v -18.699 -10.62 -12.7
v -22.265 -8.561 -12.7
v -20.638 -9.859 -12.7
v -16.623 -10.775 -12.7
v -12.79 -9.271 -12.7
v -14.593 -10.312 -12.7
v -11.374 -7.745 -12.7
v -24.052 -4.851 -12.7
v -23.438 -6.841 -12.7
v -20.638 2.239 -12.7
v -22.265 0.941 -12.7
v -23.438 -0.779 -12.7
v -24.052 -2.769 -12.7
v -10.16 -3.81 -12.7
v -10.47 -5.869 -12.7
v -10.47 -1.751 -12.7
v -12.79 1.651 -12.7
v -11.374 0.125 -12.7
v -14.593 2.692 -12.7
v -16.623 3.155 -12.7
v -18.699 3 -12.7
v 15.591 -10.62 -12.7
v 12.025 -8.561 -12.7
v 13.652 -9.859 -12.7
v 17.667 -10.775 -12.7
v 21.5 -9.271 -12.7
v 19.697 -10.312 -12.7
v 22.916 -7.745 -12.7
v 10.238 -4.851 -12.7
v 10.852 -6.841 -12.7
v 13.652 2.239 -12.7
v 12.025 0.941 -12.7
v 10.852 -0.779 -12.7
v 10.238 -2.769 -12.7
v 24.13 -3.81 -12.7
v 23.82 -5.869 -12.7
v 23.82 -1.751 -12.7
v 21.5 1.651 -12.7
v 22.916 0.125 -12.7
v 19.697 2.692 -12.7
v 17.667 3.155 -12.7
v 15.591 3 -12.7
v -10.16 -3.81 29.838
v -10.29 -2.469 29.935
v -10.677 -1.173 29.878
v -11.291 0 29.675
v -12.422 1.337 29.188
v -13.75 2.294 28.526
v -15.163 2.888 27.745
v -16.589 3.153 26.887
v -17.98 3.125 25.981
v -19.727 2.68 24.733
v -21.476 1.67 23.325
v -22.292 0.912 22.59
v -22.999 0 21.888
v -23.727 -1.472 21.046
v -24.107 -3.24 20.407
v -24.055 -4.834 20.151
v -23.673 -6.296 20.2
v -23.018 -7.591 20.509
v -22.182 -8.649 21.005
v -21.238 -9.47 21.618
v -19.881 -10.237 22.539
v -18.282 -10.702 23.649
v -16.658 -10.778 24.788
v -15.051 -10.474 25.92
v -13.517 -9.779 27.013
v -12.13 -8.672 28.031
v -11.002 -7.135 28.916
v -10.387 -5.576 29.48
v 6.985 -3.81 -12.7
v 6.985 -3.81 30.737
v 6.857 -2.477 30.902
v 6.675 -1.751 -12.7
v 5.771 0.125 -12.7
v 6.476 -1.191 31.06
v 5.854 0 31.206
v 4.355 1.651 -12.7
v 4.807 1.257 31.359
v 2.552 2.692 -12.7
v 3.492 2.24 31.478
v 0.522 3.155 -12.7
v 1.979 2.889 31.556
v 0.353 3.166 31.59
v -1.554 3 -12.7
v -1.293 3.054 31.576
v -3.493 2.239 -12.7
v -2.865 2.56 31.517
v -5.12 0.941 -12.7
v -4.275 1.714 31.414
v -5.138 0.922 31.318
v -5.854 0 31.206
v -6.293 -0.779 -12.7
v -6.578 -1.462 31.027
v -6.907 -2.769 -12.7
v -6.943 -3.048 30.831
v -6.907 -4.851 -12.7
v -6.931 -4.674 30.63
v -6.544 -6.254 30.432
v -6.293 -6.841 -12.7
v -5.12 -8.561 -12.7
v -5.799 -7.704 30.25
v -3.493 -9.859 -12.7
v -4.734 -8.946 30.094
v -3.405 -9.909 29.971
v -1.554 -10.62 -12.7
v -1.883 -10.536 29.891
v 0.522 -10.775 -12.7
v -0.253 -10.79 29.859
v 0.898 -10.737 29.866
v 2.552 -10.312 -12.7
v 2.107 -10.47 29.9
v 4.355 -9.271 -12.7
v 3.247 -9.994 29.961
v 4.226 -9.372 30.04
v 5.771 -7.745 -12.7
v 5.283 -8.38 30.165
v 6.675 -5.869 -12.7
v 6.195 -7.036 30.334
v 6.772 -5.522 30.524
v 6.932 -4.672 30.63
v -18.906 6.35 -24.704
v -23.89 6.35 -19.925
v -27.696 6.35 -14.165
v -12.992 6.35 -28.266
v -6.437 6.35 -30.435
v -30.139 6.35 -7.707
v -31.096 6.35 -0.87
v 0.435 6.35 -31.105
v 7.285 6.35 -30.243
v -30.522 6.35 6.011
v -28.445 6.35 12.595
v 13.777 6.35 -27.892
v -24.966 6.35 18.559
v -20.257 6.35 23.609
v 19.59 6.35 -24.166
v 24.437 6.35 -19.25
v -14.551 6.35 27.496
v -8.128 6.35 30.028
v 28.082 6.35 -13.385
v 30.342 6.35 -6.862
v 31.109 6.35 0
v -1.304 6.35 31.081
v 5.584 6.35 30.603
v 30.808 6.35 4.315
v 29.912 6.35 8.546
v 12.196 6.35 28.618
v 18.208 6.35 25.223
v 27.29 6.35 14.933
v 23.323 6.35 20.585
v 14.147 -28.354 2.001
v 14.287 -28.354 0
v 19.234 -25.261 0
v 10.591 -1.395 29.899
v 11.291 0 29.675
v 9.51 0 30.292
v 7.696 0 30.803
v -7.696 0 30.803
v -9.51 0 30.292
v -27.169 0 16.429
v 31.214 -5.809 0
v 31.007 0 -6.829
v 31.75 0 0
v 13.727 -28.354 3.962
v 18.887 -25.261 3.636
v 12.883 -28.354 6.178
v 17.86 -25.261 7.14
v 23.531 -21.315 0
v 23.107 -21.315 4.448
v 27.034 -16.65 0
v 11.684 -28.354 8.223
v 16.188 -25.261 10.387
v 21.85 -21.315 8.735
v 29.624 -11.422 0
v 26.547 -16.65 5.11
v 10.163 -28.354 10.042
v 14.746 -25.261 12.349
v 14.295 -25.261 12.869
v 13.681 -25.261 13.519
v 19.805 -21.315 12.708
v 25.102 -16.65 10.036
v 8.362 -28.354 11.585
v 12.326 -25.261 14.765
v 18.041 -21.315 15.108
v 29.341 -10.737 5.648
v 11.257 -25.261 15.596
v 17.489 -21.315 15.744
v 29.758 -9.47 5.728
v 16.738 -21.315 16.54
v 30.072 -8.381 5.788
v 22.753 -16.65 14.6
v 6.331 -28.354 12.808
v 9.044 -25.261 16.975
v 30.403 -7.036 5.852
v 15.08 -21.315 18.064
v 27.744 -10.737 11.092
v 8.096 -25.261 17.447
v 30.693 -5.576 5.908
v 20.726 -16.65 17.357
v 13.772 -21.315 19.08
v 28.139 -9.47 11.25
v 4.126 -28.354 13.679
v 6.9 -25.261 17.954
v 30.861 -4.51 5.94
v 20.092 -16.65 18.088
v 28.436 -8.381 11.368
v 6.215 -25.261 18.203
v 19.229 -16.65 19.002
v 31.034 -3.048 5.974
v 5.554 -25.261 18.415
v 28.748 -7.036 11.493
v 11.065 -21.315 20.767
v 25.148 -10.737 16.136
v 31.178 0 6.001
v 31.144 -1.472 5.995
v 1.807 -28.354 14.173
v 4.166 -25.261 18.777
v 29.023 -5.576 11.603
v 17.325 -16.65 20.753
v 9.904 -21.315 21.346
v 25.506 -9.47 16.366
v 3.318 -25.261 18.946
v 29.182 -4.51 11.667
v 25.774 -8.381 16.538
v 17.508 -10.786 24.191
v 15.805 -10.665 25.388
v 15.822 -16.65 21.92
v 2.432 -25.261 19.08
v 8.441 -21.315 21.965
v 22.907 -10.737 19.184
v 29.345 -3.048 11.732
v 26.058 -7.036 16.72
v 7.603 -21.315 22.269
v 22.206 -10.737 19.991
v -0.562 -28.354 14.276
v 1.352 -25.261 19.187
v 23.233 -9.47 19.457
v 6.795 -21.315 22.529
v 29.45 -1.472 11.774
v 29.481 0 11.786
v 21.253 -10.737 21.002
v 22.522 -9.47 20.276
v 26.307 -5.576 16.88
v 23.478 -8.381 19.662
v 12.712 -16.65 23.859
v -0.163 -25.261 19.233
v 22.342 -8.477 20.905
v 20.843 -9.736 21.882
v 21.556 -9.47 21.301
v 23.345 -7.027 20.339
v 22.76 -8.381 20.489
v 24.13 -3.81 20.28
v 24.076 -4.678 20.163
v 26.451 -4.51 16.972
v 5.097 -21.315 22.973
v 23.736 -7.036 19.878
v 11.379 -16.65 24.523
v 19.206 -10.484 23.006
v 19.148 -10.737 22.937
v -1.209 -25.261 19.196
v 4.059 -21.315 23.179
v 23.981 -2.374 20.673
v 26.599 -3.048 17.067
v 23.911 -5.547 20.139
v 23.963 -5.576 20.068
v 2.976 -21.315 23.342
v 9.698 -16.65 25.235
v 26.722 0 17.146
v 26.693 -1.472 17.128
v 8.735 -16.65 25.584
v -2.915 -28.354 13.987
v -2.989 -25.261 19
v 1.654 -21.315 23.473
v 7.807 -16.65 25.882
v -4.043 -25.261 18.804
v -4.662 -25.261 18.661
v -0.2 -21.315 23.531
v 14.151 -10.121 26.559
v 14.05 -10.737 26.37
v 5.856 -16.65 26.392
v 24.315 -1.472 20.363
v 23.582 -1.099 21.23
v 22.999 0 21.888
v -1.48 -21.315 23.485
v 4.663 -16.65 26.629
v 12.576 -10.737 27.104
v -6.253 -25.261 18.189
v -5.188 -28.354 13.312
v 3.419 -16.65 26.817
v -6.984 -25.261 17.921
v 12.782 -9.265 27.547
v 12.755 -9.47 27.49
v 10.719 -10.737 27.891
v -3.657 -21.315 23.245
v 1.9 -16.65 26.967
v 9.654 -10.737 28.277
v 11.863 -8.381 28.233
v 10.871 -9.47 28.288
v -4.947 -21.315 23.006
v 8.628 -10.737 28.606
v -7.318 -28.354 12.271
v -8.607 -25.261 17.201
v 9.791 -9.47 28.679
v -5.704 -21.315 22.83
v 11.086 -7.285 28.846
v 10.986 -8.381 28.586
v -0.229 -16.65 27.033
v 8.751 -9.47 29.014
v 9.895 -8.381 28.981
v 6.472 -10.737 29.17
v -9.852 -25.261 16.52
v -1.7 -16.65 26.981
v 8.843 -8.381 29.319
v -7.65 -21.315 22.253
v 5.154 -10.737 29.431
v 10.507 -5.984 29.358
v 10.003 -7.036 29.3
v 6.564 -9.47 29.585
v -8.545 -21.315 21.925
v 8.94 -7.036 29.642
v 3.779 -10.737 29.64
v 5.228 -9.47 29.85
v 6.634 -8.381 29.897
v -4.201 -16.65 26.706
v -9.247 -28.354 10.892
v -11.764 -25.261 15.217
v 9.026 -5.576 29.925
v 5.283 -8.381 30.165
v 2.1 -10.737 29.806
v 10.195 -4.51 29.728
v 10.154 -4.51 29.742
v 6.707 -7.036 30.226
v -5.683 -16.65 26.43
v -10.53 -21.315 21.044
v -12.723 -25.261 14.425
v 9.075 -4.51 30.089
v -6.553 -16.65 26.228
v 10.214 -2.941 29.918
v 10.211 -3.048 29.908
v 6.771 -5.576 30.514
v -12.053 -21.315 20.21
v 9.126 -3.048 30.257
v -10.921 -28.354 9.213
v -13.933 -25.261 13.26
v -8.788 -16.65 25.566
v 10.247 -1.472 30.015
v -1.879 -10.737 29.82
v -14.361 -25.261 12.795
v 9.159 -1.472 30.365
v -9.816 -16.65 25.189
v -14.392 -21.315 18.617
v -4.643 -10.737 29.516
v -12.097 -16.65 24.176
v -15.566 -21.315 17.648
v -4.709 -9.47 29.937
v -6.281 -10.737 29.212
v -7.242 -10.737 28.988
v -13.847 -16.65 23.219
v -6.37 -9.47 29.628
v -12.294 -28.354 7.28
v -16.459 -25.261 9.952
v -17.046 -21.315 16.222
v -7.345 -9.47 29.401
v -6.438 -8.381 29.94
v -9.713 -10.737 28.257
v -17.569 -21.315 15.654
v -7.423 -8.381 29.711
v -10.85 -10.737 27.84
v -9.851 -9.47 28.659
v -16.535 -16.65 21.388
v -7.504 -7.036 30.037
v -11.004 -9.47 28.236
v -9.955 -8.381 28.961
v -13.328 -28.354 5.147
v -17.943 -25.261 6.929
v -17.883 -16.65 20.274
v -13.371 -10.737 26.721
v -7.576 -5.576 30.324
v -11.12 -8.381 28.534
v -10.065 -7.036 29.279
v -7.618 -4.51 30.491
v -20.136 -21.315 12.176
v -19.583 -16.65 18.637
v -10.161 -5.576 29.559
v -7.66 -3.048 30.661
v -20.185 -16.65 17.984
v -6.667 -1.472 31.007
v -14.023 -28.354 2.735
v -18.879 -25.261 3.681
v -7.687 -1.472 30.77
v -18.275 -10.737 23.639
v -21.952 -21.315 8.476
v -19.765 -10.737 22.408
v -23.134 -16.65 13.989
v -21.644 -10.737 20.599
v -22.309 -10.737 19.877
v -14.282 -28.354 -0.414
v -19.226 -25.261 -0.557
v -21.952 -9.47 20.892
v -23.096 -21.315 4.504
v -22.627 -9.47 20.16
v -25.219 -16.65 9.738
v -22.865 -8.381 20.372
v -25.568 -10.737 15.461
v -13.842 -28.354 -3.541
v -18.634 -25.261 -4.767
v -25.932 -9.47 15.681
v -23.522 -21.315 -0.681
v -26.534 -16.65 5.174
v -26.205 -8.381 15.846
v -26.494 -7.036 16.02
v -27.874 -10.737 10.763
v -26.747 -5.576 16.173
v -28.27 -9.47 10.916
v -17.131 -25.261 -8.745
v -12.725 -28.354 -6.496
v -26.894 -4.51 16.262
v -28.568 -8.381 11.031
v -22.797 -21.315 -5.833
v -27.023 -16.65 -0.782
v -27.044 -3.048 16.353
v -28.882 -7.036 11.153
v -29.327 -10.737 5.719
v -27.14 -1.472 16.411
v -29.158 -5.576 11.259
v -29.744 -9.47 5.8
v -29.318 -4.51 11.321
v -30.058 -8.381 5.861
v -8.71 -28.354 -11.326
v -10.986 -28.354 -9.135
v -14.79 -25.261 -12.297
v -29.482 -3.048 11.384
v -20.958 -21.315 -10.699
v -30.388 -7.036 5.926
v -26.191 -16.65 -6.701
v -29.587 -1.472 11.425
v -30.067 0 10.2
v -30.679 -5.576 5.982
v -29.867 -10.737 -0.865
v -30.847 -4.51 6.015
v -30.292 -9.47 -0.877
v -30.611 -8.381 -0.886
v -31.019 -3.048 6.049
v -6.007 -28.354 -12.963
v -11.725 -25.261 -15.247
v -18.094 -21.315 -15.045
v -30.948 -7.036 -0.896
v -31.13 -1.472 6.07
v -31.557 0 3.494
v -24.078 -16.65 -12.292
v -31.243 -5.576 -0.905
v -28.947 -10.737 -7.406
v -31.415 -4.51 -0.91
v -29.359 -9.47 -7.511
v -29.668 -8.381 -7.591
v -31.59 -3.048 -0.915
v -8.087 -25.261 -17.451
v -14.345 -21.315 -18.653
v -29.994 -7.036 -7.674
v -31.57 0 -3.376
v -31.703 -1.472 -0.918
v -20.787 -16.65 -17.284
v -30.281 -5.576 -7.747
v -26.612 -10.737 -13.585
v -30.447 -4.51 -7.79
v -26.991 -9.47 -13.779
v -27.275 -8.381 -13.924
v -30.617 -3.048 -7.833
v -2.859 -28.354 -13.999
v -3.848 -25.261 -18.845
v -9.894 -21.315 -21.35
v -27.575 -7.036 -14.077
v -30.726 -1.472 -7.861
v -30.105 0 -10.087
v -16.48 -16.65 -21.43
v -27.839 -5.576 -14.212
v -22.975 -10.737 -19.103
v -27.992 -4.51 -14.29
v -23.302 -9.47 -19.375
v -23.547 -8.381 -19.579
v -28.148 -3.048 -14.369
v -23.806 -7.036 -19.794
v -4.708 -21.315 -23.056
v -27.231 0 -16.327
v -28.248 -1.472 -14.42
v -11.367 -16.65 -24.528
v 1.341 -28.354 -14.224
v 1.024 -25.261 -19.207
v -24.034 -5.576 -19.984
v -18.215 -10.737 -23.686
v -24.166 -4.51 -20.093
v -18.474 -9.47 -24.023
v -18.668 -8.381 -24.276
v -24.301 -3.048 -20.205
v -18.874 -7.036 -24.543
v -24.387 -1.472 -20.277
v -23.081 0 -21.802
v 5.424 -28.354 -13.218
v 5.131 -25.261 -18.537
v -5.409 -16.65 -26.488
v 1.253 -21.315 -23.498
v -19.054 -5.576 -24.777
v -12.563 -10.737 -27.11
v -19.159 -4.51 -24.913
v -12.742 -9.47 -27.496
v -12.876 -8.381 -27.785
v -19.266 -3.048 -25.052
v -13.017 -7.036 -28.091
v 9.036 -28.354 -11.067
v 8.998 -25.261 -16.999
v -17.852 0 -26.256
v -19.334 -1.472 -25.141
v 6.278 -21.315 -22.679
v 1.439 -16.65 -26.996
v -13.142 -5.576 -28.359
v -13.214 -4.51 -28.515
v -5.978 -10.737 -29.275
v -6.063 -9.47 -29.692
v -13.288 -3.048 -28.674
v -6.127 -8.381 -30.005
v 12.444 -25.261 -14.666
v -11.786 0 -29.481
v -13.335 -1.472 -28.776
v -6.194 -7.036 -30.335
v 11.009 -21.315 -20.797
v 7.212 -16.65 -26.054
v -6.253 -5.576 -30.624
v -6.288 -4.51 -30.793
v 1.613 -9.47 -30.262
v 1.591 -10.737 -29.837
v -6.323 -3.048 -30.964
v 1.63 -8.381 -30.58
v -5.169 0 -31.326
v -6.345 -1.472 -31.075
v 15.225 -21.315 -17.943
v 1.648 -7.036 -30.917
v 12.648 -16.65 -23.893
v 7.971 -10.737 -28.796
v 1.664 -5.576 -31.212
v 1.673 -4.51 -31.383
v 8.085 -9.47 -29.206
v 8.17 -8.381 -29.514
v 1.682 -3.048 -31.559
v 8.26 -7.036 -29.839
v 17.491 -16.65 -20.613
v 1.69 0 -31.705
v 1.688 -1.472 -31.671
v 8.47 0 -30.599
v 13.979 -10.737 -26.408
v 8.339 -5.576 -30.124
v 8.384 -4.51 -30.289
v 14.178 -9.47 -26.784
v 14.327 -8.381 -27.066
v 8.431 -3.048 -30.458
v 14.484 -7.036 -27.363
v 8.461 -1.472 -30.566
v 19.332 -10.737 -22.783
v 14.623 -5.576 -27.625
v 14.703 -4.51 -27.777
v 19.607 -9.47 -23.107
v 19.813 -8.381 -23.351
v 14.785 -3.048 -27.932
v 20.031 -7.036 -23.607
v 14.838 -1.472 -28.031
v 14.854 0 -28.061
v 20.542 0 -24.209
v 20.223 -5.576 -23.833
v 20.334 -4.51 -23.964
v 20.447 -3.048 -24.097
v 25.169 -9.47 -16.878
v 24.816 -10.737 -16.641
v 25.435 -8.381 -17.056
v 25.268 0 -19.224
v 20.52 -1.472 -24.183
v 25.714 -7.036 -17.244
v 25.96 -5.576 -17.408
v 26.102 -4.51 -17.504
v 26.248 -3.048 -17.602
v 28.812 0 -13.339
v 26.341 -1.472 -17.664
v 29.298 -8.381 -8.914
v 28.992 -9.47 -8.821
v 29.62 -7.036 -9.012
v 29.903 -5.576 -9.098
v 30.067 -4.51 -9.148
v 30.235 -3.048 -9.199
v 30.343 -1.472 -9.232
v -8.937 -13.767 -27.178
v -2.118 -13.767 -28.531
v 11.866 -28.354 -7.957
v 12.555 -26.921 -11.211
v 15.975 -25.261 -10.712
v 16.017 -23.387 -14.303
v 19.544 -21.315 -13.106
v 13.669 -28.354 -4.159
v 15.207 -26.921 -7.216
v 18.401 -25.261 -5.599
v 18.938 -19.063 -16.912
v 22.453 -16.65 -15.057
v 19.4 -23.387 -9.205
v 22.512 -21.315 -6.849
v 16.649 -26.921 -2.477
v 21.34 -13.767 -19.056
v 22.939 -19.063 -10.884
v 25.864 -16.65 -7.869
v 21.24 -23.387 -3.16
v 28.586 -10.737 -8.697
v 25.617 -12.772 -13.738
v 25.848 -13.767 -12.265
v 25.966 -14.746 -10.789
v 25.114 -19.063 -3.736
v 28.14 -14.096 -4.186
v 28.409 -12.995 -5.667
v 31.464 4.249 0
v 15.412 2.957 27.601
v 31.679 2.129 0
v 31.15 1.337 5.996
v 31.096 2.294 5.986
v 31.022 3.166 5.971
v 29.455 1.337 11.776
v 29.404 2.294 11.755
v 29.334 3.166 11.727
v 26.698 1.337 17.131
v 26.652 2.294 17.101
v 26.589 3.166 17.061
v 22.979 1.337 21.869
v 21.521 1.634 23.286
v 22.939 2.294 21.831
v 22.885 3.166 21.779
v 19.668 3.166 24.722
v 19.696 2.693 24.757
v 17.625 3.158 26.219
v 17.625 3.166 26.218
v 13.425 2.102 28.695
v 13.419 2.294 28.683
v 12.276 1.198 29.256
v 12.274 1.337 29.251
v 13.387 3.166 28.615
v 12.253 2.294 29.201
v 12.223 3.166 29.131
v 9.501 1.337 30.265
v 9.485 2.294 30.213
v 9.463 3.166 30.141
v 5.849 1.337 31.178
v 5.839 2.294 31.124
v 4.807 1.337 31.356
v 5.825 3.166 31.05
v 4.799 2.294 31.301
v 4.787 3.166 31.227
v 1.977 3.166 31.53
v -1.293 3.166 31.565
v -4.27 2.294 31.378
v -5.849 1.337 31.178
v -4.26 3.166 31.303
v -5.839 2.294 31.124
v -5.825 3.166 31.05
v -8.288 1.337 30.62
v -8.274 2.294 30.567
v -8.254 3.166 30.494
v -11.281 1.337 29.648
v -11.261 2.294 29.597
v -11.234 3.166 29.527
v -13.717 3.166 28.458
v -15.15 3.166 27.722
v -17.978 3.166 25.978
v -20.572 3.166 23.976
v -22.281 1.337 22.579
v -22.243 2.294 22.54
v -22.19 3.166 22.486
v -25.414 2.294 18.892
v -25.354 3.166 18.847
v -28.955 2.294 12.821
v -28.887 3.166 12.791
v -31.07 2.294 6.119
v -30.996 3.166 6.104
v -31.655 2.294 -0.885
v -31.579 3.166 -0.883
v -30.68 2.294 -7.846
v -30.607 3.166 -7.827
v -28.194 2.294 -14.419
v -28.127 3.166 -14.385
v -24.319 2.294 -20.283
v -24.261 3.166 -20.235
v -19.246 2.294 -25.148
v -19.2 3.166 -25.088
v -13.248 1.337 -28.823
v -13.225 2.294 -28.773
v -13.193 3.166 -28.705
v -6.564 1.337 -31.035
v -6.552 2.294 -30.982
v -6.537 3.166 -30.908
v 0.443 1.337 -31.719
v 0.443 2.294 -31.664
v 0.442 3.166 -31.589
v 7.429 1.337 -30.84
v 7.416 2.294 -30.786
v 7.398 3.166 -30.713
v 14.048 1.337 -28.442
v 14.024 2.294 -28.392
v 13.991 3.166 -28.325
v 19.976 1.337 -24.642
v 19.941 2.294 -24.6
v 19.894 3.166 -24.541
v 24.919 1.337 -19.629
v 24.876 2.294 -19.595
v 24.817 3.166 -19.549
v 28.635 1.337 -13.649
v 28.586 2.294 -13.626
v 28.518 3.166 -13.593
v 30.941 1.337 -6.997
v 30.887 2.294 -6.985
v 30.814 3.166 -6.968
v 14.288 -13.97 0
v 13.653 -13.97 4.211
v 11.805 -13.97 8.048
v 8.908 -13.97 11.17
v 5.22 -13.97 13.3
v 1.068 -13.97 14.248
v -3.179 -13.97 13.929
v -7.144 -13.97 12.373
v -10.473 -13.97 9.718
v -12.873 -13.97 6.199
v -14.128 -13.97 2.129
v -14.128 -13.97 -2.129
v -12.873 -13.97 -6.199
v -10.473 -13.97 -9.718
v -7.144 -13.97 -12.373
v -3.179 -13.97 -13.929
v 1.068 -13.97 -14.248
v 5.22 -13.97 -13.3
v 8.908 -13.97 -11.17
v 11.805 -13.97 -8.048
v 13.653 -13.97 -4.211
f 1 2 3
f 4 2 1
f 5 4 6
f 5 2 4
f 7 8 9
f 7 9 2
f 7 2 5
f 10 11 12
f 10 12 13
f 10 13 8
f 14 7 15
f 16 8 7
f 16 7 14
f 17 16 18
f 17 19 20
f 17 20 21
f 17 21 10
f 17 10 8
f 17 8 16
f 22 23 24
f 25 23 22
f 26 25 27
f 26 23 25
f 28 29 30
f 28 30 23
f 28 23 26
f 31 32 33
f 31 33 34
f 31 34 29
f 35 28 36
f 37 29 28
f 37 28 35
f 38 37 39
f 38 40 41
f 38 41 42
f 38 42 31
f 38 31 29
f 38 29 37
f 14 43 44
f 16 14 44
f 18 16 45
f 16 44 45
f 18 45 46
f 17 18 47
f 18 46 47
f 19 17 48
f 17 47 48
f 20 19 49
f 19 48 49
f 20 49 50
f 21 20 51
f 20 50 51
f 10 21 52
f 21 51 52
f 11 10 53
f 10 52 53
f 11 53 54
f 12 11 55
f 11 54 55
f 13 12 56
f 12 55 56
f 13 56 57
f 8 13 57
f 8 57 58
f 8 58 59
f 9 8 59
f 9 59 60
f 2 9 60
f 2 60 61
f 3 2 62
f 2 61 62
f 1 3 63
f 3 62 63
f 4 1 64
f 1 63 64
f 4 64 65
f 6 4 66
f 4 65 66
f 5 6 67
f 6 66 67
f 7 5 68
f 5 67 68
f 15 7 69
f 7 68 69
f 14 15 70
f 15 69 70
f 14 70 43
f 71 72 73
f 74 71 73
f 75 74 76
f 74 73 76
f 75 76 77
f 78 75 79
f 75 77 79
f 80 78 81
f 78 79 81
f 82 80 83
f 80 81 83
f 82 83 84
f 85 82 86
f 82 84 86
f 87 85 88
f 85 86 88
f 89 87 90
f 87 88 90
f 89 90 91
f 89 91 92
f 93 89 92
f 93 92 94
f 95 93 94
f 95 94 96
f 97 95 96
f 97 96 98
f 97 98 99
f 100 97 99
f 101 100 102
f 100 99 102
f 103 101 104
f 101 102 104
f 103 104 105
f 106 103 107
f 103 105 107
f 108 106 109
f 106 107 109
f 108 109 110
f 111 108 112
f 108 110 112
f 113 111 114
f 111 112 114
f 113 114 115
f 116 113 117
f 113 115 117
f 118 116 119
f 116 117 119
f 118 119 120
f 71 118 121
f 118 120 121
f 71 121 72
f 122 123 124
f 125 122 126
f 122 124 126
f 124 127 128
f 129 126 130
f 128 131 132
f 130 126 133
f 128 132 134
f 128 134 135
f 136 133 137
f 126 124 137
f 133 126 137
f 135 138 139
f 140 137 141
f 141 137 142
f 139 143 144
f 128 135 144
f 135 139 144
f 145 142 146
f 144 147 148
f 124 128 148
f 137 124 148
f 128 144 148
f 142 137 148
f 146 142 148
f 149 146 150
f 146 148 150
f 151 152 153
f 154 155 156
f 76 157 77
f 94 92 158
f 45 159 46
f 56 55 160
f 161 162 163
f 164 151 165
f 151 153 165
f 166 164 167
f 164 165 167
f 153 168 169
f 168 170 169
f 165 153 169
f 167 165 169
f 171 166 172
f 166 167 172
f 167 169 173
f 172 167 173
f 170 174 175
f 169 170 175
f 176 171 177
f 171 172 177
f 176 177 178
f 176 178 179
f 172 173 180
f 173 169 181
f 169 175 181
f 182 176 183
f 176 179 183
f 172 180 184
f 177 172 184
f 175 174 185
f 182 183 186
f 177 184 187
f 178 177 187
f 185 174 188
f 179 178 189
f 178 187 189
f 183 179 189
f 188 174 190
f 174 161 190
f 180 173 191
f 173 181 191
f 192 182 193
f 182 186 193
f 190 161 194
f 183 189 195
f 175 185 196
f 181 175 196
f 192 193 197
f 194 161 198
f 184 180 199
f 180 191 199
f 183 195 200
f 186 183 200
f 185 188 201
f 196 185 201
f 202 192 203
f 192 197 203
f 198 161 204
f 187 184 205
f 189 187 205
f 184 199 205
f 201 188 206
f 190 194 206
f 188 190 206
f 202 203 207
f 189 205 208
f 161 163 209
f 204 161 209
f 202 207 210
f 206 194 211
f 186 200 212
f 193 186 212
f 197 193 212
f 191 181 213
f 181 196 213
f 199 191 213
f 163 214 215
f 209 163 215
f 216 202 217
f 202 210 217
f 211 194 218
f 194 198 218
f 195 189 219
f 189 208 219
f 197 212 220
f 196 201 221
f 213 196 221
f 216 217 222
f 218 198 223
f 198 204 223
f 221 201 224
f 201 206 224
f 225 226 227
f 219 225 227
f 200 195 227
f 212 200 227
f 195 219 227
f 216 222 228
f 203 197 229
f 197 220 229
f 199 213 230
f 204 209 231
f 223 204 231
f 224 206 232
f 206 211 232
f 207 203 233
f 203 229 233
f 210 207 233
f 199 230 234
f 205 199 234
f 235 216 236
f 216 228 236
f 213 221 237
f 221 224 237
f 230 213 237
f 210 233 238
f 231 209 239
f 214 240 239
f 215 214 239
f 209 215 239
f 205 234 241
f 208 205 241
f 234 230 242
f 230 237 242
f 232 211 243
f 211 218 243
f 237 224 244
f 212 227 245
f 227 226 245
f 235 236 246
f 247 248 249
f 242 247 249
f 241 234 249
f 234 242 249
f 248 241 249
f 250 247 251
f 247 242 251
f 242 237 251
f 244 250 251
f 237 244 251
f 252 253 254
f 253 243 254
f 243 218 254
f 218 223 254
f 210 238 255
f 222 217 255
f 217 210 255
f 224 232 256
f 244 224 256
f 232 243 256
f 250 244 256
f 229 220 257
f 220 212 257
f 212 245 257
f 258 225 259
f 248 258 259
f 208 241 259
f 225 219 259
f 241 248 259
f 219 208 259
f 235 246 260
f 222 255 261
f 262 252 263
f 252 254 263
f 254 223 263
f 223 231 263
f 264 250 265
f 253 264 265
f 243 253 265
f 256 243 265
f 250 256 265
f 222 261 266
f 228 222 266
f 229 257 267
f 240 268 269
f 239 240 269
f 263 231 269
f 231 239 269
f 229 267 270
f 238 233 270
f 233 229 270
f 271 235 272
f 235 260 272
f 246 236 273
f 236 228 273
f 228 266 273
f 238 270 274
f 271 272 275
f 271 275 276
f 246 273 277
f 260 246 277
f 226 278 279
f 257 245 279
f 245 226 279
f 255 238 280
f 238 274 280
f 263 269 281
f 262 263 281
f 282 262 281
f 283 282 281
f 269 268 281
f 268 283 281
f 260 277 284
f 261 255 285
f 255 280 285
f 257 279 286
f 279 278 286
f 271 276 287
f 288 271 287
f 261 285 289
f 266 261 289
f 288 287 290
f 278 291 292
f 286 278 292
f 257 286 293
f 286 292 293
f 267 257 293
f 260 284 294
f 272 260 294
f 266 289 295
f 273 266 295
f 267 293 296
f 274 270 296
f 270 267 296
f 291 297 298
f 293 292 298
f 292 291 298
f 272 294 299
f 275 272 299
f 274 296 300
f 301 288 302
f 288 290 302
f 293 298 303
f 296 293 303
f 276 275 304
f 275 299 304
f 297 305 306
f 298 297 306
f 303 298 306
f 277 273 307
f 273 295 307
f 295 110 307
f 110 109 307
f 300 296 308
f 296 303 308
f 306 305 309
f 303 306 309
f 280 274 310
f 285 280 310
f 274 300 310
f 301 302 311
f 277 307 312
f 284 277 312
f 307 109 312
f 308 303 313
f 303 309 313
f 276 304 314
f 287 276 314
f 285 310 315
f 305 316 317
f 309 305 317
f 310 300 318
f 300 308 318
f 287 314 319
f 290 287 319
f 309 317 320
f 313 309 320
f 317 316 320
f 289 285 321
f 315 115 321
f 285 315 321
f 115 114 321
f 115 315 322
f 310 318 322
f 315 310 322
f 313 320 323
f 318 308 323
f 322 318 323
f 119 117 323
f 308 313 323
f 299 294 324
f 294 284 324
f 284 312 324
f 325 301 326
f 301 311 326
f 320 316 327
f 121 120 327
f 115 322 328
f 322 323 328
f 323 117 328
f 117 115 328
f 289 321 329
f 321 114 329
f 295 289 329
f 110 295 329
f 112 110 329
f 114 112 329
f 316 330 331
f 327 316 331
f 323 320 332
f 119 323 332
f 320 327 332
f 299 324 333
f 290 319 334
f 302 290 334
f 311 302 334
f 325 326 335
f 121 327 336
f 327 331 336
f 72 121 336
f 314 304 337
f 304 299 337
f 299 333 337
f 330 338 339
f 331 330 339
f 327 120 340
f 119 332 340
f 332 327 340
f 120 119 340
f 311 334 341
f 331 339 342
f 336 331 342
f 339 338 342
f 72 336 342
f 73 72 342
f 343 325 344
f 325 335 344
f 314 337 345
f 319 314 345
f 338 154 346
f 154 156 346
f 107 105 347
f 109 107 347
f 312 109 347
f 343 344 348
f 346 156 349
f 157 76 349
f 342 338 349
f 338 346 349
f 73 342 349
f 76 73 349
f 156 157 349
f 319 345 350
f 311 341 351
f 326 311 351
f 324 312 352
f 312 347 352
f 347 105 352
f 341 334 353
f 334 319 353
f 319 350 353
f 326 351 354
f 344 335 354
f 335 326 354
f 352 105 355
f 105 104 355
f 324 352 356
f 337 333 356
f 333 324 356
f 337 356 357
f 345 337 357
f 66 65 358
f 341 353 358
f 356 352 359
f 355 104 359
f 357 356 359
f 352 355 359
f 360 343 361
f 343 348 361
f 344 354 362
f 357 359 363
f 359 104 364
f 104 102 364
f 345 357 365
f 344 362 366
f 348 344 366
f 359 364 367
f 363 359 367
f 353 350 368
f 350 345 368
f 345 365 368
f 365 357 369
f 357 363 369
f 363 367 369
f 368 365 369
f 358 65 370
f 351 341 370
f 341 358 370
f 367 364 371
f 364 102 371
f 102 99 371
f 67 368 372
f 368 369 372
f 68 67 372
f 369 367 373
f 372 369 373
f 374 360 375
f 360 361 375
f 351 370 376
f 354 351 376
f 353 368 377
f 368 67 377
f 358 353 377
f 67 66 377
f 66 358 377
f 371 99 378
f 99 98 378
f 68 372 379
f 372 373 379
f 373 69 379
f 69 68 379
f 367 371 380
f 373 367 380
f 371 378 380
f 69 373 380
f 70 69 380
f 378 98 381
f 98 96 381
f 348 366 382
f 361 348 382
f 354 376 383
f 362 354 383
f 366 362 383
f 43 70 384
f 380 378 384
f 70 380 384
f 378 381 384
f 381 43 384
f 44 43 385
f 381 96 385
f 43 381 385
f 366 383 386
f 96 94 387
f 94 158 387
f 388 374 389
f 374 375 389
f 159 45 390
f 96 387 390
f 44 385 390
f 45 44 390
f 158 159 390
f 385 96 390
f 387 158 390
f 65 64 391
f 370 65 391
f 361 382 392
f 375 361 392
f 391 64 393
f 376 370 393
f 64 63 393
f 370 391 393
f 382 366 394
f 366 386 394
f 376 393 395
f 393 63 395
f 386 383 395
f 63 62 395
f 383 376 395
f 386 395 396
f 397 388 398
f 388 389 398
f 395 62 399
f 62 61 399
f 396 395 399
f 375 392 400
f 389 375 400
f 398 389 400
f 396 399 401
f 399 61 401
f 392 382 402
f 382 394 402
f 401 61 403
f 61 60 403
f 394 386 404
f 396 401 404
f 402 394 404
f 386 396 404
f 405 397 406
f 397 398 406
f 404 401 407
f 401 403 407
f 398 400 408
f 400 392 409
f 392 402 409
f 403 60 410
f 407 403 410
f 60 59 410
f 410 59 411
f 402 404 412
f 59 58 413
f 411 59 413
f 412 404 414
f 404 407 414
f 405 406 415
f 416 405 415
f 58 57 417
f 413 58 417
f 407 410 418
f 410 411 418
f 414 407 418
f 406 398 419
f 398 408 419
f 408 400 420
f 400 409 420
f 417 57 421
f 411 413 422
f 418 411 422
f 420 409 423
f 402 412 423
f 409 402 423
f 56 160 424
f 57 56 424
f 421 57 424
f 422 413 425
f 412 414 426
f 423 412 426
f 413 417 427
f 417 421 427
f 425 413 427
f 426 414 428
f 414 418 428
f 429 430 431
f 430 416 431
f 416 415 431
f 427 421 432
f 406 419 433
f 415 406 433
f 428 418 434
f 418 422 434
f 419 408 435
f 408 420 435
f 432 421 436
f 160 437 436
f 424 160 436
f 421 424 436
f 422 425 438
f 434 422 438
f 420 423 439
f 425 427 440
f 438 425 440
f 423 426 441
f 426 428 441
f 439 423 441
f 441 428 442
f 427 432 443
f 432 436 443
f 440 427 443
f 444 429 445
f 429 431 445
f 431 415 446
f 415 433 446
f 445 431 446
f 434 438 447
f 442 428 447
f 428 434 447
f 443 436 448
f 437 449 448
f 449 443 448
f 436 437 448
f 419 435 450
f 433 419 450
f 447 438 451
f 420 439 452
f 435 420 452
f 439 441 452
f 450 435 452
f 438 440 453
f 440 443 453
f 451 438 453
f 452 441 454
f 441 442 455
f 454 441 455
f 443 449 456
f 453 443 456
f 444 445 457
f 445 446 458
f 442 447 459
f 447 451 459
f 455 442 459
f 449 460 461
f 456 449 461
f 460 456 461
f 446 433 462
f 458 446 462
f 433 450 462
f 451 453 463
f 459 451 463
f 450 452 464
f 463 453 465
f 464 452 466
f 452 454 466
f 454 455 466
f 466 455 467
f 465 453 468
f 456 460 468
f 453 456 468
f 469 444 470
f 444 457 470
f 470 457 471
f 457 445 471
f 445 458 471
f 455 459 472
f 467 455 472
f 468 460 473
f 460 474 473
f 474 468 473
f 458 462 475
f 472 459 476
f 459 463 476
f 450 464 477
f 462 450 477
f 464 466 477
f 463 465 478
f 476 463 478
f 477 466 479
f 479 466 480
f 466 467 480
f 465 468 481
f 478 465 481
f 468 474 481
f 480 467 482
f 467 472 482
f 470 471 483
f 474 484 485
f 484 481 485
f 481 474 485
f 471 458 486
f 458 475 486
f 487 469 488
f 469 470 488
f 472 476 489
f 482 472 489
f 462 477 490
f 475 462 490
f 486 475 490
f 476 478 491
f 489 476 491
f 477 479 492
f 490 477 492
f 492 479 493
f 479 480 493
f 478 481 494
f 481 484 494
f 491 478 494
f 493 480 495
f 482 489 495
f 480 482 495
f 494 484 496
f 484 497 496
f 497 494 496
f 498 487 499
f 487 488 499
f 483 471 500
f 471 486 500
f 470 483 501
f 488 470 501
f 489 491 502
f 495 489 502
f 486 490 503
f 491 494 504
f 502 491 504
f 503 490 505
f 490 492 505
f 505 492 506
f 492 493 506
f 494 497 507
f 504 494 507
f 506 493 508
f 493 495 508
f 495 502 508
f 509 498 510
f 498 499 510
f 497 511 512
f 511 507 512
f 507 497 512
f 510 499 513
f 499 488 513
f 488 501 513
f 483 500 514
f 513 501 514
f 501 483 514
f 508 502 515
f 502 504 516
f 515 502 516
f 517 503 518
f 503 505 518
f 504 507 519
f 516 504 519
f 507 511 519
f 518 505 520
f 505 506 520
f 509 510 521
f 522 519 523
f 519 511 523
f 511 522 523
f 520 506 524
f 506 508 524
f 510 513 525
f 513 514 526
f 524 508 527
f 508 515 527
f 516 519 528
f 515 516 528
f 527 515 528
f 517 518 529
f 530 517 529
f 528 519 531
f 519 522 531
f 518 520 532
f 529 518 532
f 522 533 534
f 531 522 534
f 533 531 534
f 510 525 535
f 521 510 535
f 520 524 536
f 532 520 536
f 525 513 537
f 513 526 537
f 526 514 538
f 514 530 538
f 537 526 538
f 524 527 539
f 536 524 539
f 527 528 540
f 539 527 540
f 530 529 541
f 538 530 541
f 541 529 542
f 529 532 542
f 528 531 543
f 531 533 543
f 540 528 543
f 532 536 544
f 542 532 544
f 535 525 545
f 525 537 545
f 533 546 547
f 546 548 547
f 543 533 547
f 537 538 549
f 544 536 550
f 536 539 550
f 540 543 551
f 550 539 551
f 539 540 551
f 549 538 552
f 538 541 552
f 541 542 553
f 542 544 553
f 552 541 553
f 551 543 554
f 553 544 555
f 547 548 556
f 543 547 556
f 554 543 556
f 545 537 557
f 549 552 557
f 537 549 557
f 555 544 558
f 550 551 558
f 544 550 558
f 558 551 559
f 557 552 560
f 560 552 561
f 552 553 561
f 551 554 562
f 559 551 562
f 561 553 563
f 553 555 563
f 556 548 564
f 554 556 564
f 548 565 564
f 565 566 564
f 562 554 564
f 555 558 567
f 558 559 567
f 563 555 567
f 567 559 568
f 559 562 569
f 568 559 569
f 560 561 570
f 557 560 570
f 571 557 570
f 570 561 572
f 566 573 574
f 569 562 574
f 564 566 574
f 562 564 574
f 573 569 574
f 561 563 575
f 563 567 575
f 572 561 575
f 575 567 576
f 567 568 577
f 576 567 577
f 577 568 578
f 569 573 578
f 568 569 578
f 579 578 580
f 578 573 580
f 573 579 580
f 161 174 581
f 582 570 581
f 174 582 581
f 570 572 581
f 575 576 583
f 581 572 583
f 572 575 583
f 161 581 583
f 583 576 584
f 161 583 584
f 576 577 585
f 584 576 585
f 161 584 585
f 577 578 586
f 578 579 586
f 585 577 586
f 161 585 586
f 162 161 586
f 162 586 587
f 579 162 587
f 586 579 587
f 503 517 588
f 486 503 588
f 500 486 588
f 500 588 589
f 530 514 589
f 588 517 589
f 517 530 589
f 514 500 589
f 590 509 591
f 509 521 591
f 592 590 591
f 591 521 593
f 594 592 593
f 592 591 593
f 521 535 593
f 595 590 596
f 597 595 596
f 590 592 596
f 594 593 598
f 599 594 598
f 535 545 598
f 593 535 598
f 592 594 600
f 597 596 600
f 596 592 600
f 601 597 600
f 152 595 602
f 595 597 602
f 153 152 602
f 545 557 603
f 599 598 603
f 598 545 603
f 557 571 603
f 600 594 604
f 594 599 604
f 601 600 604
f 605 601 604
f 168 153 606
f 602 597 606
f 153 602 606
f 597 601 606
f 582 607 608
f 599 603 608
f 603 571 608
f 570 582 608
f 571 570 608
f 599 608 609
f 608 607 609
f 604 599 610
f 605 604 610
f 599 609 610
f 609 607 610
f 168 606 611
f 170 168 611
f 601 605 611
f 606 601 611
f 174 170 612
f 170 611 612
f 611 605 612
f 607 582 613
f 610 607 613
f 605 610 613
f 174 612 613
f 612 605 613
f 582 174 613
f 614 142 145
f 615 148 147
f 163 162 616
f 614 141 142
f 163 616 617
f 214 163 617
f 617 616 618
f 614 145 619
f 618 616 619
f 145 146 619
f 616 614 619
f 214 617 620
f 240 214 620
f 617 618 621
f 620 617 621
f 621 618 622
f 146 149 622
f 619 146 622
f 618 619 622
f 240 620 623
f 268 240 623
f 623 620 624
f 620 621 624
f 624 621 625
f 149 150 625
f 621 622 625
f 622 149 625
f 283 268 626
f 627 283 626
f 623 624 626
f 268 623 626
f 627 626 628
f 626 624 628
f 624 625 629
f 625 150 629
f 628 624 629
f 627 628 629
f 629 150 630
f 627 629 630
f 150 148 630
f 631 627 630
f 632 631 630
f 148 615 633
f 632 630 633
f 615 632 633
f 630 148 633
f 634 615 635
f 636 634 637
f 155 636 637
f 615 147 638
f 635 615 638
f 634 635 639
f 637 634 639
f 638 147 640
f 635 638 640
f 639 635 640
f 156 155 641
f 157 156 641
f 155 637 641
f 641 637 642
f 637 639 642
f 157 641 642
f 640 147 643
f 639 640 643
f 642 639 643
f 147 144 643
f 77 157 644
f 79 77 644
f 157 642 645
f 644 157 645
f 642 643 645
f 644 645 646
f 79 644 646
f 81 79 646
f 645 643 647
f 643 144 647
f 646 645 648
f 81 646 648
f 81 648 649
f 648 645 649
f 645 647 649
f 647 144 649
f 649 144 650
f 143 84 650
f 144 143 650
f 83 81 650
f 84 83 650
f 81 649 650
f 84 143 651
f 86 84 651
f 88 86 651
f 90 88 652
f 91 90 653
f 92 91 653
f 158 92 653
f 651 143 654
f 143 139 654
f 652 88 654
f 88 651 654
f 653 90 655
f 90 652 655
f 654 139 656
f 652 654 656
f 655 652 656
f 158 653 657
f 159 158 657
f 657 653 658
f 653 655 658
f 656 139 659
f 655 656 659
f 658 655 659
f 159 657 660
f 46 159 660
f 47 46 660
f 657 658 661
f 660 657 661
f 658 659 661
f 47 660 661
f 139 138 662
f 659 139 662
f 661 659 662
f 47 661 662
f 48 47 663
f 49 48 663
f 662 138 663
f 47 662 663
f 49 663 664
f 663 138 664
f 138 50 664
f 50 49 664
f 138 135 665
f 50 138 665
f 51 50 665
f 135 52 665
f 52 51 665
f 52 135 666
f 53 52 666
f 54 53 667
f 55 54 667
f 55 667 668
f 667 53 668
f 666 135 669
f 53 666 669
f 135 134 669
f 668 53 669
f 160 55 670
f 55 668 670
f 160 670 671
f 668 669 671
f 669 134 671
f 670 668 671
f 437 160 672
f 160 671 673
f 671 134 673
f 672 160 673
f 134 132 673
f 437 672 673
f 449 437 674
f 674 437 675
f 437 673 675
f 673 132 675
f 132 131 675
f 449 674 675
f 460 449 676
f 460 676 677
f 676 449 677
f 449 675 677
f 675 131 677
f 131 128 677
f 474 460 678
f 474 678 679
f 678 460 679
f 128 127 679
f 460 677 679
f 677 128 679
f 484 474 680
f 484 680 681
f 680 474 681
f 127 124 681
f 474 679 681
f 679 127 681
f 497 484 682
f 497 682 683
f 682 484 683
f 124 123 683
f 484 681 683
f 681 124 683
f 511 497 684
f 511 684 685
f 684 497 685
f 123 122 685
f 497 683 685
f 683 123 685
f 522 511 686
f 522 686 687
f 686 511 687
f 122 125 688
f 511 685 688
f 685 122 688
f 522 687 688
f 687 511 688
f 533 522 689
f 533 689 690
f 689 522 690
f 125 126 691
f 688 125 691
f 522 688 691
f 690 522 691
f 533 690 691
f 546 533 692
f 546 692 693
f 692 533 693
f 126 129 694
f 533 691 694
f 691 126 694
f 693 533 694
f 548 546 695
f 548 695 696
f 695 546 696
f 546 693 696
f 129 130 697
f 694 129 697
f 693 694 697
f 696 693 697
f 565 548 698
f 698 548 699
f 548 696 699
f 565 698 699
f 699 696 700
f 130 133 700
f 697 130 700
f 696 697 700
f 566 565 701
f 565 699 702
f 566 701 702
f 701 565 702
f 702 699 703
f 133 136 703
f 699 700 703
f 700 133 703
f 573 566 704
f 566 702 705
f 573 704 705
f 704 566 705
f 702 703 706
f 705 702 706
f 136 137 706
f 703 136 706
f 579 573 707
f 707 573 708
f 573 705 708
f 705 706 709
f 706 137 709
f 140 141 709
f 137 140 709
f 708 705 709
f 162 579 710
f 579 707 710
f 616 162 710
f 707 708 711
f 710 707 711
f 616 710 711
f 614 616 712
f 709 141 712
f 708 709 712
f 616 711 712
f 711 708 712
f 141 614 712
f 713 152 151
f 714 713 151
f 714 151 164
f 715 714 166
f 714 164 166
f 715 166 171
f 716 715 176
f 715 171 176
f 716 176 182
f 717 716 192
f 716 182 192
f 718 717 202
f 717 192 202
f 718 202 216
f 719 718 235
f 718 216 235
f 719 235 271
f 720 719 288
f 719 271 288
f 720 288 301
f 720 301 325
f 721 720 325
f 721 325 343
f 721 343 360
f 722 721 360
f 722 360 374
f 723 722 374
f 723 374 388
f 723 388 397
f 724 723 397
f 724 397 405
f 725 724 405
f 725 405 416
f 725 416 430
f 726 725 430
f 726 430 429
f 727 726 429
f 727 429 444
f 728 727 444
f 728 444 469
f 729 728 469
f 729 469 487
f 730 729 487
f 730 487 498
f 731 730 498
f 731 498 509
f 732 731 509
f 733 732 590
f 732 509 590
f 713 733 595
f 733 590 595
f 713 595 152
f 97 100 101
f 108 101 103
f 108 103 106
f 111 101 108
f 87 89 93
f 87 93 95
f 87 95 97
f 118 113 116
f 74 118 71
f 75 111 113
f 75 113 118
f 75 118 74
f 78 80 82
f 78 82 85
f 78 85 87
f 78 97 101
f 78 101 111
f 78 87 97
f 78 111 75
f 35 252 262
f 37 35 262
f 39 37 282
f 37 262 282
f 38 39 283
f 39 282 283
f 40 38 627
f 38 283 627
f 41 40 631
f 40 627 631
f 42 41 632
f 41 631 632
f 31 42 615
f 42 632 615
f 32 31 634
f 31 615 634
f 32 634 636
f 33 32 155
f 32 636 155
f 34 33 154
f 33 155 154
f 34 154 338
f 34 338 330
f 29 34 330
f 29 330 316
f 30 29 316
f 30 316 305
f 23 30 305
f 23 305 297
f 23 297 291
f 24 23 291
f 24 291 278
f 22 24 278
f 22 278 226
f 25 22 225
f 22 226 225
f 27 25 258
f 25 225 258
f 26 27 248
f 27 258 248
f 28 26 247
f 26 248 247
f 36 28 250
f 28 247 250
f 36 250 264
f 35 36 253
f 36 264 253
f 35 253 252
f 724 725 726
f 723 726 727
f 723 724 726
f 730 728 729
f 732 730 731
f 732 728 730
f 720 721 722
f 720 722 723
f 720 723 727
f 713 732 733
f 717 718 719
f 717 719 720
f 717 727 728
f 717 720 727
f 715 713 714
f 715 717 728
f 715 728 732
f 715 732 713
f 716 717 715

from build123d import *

# Parameters (mm, degrees)
F3_W      = 262.908466
F3_H      = 206.398711
F4_DEPTH  = 25.4
F6_R      = 6.985
F7_DEPTH  = 44.45
F9_R      = 14.2875
F10_DEPTH = 17.78


with BuildPart() as f1:
    # F0 (on Top) → F1 (revolve)
    with BuildSketch(Plane.XY):
        with BuildLine():
            ThreePointArc((0, -31.75), (22.45064, -22.45064), (31.75, 0))
            ThreePointArc((31.75, 0), (22.45064, 22.45064), (0, 31.75))
            Line((0, 31.75), (0, -31.75))
        make_face()
    revolve(axis=Axis((0, 0, 0), (0, -1, 0)))

    # F3 (on offset) → F4 (cut)
    with BuildSketch(Plane.XZ.offset(-6.35)):
        with Locations((11.150669, 15.533521)):
            Rectangle(F3_W, F3_H)
    extrude(amount=-F4_DEPTH, mode=Mode.SUBTRACT)

    # F6 (on offset) → F7 (cut)
    with BuildSketch(Plane.XY.offset(31.75)):
        with Locations((0, -3.81)):
            Circle(F6_R)
        with Locations((-17.145, -3.81)):
            Circle(F6_R)
        with Locations((17.145, -3.81)):
            Circle(F6_R)
    extrude(amount=-F7_DEPTH, mode=Mode.SUBTRACT)

    # F9 (on offset) → F10 (cut)
    with BuildSketch(Plane.XZ.offset(31.75)):
        Circle(F9_R)
    extrude(amount=-F10_DEPTH, mode=Mode.SUBTRACT)


solid = f1.part
